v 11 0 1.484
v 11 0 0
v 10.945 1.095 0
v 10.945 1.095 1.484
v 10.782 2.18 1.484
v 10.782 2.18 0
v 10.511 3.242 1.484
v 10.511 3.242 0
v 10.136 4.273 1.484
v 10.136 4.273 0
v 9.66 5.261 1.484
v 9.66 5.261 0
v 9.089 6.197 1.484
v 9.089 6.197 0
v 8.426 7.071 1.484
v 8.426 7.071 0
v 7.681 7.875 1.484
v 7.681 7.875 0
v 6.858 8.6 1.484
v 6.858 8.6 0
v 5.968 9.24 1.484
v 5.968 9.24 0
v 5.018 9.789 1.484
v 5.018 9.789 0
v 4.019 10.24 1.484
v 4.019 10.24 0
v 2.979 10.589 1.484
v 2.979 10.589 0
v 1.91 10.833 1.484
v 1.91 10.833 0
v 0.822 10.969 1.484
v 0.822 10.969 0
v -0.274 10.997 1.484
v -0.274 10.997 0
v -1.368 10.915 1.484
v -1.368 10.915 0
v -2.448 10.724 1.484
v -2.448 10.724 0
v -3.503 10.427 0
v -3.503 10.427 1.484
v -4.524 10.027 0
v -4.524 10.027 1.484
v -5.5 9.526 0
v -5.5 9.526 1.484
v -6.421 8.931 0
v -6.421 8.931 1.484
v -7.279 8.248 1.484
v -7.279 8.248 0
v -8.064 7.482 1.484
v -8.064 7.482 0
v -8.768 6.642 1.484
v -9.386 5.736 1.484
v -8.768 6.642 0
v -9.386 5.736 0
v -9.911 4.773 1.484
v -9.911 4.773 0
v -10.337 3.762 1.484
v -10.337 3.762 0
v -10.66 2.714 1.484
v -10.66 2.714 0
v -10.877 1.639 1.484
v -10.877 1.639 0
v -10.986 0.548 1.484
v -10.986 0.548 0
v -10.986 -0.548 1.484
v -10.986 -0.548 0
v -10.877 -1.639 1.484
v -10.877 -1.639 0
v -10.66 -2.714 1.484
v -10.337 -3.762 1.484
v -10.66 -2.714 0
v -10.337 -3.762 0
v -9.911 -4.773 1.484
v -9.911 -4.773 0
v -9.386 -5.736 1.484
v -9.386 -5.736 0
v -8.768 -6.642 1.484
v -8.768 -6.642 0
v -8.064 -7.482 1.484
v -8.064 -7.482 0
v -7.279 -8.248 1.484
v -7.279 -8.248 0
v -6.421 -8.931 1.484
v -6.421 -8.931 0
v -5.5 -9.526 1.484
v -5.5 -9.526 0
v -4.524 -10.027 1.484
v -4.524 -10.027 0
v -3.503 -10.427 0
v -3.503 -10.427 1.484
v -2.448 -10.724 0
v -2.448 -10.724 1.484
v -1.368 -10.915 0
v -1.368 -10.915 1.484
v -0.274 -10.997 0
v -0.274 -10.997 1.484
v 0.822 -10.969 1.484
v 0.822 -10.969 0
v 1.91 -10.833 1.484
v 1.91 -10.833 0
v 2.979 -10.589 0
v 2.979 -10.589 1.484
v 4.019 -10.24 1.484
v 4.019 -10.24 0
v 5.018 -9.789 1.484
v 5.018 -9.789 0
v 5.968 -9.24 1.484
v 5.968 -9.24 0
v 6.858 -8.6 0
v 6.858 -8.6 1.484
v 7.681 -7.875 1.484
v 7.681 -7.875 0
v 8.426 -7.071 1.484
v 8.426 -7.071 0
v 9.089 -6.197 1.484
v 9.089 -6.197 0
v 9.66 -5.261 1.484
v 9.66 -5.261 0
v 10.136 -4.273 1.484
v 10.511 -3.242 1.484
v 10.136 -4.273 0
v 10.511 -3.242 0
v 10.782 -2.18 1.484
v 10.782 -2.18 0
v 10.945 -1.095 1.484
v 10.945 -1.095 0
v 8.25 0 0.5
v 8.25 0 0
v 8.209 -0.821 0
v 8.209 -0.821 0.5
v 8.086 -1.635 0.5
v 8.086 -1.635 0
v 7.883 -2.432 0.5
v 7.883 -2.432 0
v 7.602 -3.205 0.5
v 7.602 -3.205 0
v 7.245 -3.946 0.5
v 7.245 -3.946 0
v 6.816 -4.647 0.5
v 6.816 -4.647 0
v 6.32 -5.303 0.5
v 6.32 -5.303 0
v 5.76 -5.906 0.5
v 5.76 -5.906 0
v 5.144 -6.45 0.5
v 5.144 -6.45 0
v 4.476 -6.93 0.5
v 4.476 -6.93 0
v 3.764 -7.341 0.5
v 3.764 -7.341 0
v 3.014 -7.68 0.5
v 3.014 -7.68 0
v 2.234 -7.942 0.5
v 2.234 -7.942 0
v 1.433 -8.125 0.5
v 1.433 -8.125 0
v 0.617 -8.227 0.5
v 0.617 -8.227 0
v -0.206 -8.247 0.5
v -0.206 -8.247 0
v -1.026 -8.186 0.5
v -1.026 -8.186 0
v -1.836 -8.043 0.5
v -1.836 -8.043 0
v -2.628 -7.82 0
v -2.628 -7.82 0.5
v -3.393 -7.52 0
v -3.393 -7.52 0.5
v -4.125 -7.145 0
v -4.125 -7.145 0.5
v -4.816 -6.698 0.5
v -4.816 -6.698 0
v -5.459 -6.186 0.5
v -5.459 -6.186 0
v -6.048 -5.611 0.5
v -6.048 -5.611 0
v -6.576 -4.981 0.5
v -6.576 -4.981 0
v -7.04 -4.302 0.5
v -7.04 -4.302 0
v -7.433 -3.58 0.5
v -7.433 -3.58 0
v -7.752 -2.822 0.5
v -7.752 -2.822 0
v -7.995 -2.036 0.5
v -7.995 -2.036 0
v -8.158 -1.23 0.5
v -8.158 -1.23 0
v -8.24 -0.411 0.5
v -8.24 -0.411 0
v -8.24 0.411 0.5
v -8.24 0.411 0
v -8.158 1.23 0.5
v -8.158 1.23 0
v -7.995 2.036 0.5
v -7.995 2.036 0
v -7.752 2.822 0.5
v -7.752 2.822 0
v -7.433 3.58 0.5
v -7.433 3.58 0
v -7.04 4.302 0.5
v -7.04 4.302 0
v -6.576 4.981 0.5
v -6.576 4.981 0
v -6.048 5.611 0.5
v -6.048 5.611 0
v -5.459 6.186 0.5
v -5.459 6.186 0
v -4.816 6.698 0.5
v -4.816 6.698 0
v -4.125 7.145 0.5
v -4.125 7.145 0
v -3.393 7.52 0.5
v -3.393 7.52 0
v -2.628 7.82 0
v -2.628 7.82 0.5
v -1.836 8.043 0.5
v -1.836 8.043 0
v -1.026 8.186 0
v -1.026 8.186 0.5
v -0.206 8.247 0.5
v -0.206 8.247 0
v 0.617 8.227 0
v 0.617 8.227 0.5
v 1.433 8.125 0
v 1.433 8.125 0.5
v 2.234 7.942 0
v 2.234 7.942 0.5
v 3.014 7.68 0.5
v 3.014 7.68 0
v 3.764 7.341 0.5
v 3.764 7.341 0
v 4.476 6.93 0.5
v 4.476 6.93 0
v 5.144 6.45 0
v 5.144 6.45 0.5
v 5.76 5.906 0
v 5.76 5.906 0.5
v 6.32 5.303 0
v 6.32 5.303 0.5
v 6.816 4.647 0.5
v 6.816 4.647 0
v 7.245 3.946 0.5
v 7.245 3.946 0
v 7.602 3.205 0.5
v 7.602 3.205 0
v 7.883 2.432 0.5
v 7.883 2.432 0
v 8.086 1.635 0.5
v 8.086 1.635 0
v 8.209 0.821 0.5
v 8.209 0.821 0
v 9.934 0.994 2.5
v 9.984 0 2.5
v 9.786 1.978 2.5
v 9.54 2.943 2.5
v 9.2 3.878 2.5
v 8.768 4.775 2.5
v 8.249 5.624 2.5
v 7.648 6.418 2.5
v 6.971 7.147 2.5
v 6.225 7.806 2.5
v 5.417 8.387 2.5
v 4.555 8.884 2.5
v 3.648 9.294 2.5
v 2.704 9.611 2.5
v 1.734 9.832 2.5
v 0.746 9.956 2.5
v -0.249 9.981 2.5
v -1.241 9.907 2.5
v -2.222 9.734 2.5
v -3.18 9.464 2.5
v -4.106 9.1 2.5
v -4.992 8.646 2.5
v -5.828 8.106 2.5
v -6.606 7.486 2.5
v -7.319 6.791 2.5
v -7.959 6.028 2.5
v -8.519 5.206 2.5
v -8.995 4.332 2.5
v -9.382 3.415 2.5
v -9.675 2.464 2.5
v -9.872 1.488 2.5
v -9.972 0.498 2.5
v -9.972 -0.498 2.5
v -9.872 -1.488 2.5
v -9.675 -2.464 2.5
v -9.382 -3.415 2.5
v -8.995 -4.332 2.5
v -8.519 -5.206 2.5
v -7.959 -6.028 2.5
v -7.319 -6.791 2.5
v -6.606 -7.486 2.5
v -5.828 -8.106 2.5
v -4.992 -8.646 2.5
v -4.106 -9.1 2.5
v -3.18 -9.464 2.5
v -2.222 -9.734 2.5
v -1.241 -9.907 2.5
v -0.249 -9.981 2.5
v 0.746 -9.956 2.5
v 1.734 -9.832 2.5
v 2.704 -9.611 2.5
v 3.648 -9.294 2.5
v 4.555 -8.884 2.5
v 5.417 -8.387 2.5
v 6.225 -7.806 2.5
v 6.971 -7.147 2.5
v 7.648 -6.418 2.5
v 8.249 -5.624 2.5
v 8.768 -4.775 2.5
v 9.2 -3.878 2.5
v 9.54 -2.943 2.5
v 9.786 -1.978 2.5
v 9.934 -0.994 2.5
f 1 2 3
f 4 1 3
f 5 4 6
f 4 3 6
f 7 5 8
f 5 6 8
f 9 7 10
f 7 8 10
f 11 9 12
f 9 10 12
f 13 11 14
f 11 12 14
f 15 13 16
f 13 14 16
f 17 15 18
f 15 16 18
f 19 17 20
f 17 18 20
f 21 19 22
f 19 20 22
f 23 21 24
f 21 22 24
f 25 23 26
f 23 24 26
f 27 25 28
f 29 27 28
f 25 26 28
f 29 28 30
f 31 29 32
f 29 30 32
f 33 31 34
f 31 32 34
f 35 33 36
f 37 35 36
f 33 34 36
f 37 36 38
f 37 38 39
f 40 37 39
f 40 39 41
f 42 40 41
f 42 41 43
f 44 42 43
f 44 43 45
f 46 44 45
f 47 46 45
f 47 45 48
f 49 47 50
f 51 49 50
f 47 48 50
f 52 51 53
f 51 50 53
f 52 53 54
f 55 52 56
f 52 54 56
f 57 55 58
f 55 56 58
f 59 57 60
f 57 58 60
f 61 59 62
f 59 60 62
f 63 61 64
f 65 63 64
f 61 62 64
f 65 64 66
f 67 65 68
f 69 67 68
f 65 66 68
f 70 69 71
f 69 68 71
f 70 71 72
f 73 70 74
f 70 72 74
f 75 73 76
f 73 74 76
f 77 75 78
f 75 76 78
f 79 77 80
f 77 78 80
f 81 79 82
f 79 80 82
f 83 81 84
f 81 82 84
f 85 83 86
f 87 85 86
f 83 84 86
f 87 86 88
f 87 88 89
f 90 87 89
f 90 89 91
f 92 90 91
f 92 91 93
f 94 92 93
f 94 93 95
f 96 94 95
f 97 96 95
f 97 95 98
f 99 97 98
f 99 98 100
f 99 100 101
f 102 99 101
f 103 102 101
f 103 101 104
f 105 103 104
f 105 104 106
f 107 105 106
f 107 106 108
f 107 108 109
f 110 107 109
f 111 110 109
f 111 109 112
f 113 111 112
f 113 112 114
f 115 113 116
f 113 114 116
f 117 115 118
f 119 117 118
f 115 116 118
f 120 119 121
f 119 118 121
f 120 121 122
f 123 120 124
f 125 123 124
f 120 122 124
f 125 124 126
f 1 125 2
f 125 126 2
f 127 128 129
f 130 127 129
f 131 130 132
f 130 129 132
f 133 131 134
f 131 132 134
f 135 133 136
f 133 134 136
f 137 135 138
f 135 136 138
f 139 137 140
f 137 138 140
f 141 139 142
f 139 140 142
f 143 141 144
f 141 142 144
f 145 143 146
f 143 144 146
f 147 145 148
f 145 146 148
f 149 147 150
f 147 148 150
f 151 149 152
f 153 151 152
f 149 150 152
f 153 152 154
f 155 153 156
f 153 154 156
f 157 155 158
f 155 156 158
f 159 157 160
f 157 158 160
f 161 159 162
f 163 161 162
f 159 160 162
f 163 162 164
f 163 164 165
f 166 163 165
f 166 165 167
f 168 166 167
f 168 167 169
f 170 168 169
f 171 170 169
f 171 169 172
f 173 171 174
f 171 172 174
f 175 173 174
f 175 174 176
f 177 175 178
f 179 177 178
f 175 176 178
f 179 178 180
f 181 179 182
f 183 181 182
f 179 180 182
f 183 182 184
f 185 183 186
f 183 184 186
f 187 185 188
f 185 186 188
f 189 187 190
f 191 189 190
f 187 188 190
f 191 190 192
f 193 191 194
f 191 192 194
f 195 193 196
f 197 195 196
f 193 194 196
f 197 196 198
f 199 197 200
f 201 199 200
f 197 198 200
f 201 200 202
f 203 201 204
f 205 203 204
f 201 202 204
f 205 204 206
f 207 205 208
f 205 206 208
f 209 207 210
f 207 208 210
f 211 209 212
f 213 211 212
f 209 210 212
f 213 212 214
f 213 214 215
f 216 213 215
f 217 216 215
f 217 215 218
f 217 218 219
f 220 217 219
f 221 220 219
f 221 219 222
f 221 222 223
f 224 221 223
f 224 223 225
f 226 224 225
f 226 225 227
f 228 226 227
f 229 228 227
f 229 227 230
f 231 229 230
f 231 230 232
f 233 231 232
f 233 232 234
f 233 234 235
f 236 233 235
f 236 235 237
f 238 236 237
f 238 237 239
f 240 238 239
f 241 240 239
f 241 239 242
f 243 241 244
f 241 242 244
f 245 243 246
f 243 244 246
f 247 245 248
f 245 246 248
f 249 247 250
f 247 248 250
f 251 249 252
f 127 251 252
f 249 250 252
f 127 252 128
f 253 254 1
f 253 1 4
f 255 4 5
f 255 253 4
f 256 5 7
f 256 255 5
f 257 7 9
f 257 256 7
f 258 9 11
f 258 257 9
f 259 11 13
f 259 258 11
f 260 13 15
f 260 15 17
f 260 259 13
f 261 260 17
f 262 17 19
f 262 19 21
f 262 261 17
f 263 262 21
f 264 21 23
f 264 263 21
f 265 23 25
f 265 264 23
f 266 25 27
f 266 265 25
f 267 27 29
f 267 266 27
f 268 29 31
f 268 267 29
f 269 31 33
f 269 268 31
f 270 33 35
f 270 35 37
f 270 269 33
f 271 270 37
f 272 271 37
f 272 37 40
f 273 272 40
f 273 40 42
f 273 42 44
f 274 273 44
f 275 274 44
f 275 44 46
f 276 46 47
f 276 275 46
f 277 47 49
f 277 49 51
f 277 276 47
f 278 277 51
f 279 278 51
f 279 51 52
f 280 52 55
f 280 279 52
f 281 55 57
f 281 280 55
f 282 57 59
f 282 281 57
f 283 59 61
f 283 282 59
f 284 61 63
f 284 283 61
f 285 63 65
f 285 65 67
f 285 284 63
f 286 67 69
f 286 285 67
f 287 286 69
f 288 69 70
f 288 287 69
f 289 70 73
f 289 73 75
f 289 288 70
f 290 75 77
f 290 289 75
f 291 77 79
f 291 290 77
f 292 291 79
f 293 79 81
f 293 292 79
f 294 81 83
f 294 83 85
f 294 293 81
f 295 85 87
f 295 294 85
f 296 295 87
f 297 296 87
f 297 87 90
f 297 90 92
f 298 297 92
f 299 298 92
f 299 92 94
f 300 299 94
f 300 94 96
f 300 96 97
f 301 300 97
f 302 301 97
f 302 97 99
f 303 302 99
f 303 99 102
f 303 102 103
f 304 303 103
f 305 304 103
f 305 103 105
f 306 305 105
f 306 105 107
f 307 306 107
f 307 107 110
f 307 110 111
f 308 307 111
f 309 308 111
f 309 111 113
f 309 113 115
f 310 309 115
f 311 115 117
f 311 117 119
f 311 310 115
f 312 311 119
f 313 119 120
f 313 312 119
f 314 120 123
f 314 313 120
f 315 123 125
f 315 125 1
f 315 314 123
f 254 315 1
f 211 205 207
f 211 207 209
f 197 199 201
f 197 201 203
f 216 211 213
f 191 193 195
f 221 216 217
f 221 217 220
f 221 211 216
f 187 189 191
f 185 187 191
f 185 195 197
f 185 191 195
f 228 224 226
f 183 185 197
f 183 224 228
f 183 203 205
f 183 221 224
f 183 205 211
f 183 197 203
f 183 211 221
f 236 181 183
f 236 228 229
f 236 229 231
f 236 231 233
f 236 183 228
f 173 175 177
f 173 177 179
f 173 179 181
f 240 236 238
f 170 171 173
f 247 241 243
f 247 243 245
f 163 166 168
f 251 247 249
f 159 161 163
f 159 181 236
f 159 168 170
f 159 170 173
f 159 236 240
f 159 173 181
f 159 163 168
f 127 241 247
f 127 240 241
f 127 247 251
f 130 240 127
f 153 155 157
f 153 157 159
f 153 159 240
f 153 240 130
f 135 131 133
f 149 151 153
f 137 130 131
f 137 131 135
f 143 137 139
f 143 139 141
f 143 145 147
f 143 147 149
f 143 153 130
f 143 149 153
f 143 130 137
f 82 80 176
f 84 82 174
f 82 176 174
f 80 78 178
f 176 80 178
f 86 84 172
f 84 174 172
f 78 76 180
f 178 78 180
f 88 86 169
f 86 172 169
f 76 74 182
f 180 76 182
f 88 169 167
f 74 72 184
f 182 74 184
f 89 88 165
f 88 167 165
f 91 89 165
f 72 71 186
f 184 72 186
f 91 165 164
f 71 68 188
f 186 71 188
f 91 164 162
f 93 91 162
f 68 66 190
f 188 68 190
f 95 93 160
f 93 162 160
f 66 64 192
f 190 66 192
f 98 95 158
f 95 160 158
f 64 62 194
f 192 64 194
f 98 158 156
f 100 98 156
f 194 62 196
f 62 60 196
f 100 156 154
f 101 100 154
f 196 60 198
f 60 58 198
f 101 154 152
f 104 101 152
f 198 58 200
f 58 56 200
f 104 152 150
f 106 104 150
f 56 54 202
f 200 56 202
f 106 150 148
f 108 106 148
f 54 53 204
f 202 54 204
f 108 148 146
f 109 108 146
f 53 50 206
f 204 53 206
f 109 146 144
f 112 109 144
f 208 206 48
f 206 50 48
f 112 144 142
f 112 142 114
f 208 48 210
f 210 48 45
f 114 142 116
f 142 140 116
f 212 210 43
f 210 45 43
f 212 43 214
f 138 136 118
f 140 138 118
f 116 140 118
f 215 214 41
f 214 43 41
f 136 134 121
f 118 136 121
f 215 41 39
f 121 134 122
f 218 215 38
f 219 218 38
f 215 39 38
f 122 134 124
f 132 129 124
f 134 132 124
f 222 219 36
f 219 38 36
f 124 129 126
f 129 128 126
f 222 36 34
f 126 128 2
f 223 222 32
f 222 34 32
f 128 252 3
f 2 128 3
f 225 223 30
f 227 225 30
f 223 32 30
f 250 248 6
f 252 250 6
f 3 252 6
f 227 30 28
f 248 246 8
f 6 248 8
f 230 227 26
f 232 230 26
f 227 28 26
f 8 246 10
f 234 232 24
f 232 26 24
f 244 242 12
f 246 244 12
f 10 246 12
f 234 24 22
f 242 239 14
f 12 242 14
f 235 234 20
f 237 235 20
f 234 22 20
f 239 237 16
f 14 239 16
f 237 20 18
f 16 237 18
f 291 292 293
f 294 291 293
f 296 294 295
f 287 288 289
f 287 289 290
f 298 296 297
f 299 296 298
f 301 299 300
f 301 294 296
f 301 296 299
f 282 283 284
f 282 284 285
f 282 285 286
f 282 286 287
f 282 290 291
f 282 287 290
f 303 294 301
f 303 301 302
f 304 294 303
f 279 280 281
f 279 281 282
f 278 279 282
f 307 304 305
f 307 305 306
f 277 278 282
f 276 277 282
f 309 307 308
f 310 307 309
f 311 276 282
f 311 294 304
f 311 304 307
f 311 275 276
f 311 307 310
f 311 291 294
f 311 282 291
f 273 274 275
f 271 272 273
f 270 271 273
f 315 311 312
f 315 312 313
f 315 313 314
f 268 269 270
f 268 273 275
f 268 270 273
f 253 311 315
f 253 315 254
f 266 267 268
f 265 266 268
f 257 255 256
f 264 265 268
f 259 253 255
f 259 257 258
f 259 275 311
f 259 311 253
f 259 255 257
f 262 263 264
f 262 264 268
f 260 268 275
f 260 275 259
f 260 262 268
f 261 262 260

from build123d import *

# Parameters (mm, degrees)
F0_R     = 11
F1_DEPTH = 2.5
F2_SIZE  = 1.016
F3_R     = 8.25
F4_DEPTH = 0.5


with BuildPart() as f1:
    # F0 (on Top) → F1 (new body)
    with BuildSketch(Plane.XY):
        Circle(F0_R)
    extrude(amount=F1_DEPTH)

    # F2
    f2_edges = [f1.edges().sort_by_distance(p)[0] for p in [
        (-11, 0, 2.5),
    ]]
    chamfer(f2_edges, length=F2_SIZE)

    # F3 (on face) → F4 (cut)
    with BuildSketch(Plane(origin=(0, 0, 0), x_dir=(1, 0, 0), z_dir=(0, 0, -1))):
        Circle(F3_R)
    extrude(amount=-F4_DEPTH, mode=Mode.SUBTRACT)


solid = f1.part
